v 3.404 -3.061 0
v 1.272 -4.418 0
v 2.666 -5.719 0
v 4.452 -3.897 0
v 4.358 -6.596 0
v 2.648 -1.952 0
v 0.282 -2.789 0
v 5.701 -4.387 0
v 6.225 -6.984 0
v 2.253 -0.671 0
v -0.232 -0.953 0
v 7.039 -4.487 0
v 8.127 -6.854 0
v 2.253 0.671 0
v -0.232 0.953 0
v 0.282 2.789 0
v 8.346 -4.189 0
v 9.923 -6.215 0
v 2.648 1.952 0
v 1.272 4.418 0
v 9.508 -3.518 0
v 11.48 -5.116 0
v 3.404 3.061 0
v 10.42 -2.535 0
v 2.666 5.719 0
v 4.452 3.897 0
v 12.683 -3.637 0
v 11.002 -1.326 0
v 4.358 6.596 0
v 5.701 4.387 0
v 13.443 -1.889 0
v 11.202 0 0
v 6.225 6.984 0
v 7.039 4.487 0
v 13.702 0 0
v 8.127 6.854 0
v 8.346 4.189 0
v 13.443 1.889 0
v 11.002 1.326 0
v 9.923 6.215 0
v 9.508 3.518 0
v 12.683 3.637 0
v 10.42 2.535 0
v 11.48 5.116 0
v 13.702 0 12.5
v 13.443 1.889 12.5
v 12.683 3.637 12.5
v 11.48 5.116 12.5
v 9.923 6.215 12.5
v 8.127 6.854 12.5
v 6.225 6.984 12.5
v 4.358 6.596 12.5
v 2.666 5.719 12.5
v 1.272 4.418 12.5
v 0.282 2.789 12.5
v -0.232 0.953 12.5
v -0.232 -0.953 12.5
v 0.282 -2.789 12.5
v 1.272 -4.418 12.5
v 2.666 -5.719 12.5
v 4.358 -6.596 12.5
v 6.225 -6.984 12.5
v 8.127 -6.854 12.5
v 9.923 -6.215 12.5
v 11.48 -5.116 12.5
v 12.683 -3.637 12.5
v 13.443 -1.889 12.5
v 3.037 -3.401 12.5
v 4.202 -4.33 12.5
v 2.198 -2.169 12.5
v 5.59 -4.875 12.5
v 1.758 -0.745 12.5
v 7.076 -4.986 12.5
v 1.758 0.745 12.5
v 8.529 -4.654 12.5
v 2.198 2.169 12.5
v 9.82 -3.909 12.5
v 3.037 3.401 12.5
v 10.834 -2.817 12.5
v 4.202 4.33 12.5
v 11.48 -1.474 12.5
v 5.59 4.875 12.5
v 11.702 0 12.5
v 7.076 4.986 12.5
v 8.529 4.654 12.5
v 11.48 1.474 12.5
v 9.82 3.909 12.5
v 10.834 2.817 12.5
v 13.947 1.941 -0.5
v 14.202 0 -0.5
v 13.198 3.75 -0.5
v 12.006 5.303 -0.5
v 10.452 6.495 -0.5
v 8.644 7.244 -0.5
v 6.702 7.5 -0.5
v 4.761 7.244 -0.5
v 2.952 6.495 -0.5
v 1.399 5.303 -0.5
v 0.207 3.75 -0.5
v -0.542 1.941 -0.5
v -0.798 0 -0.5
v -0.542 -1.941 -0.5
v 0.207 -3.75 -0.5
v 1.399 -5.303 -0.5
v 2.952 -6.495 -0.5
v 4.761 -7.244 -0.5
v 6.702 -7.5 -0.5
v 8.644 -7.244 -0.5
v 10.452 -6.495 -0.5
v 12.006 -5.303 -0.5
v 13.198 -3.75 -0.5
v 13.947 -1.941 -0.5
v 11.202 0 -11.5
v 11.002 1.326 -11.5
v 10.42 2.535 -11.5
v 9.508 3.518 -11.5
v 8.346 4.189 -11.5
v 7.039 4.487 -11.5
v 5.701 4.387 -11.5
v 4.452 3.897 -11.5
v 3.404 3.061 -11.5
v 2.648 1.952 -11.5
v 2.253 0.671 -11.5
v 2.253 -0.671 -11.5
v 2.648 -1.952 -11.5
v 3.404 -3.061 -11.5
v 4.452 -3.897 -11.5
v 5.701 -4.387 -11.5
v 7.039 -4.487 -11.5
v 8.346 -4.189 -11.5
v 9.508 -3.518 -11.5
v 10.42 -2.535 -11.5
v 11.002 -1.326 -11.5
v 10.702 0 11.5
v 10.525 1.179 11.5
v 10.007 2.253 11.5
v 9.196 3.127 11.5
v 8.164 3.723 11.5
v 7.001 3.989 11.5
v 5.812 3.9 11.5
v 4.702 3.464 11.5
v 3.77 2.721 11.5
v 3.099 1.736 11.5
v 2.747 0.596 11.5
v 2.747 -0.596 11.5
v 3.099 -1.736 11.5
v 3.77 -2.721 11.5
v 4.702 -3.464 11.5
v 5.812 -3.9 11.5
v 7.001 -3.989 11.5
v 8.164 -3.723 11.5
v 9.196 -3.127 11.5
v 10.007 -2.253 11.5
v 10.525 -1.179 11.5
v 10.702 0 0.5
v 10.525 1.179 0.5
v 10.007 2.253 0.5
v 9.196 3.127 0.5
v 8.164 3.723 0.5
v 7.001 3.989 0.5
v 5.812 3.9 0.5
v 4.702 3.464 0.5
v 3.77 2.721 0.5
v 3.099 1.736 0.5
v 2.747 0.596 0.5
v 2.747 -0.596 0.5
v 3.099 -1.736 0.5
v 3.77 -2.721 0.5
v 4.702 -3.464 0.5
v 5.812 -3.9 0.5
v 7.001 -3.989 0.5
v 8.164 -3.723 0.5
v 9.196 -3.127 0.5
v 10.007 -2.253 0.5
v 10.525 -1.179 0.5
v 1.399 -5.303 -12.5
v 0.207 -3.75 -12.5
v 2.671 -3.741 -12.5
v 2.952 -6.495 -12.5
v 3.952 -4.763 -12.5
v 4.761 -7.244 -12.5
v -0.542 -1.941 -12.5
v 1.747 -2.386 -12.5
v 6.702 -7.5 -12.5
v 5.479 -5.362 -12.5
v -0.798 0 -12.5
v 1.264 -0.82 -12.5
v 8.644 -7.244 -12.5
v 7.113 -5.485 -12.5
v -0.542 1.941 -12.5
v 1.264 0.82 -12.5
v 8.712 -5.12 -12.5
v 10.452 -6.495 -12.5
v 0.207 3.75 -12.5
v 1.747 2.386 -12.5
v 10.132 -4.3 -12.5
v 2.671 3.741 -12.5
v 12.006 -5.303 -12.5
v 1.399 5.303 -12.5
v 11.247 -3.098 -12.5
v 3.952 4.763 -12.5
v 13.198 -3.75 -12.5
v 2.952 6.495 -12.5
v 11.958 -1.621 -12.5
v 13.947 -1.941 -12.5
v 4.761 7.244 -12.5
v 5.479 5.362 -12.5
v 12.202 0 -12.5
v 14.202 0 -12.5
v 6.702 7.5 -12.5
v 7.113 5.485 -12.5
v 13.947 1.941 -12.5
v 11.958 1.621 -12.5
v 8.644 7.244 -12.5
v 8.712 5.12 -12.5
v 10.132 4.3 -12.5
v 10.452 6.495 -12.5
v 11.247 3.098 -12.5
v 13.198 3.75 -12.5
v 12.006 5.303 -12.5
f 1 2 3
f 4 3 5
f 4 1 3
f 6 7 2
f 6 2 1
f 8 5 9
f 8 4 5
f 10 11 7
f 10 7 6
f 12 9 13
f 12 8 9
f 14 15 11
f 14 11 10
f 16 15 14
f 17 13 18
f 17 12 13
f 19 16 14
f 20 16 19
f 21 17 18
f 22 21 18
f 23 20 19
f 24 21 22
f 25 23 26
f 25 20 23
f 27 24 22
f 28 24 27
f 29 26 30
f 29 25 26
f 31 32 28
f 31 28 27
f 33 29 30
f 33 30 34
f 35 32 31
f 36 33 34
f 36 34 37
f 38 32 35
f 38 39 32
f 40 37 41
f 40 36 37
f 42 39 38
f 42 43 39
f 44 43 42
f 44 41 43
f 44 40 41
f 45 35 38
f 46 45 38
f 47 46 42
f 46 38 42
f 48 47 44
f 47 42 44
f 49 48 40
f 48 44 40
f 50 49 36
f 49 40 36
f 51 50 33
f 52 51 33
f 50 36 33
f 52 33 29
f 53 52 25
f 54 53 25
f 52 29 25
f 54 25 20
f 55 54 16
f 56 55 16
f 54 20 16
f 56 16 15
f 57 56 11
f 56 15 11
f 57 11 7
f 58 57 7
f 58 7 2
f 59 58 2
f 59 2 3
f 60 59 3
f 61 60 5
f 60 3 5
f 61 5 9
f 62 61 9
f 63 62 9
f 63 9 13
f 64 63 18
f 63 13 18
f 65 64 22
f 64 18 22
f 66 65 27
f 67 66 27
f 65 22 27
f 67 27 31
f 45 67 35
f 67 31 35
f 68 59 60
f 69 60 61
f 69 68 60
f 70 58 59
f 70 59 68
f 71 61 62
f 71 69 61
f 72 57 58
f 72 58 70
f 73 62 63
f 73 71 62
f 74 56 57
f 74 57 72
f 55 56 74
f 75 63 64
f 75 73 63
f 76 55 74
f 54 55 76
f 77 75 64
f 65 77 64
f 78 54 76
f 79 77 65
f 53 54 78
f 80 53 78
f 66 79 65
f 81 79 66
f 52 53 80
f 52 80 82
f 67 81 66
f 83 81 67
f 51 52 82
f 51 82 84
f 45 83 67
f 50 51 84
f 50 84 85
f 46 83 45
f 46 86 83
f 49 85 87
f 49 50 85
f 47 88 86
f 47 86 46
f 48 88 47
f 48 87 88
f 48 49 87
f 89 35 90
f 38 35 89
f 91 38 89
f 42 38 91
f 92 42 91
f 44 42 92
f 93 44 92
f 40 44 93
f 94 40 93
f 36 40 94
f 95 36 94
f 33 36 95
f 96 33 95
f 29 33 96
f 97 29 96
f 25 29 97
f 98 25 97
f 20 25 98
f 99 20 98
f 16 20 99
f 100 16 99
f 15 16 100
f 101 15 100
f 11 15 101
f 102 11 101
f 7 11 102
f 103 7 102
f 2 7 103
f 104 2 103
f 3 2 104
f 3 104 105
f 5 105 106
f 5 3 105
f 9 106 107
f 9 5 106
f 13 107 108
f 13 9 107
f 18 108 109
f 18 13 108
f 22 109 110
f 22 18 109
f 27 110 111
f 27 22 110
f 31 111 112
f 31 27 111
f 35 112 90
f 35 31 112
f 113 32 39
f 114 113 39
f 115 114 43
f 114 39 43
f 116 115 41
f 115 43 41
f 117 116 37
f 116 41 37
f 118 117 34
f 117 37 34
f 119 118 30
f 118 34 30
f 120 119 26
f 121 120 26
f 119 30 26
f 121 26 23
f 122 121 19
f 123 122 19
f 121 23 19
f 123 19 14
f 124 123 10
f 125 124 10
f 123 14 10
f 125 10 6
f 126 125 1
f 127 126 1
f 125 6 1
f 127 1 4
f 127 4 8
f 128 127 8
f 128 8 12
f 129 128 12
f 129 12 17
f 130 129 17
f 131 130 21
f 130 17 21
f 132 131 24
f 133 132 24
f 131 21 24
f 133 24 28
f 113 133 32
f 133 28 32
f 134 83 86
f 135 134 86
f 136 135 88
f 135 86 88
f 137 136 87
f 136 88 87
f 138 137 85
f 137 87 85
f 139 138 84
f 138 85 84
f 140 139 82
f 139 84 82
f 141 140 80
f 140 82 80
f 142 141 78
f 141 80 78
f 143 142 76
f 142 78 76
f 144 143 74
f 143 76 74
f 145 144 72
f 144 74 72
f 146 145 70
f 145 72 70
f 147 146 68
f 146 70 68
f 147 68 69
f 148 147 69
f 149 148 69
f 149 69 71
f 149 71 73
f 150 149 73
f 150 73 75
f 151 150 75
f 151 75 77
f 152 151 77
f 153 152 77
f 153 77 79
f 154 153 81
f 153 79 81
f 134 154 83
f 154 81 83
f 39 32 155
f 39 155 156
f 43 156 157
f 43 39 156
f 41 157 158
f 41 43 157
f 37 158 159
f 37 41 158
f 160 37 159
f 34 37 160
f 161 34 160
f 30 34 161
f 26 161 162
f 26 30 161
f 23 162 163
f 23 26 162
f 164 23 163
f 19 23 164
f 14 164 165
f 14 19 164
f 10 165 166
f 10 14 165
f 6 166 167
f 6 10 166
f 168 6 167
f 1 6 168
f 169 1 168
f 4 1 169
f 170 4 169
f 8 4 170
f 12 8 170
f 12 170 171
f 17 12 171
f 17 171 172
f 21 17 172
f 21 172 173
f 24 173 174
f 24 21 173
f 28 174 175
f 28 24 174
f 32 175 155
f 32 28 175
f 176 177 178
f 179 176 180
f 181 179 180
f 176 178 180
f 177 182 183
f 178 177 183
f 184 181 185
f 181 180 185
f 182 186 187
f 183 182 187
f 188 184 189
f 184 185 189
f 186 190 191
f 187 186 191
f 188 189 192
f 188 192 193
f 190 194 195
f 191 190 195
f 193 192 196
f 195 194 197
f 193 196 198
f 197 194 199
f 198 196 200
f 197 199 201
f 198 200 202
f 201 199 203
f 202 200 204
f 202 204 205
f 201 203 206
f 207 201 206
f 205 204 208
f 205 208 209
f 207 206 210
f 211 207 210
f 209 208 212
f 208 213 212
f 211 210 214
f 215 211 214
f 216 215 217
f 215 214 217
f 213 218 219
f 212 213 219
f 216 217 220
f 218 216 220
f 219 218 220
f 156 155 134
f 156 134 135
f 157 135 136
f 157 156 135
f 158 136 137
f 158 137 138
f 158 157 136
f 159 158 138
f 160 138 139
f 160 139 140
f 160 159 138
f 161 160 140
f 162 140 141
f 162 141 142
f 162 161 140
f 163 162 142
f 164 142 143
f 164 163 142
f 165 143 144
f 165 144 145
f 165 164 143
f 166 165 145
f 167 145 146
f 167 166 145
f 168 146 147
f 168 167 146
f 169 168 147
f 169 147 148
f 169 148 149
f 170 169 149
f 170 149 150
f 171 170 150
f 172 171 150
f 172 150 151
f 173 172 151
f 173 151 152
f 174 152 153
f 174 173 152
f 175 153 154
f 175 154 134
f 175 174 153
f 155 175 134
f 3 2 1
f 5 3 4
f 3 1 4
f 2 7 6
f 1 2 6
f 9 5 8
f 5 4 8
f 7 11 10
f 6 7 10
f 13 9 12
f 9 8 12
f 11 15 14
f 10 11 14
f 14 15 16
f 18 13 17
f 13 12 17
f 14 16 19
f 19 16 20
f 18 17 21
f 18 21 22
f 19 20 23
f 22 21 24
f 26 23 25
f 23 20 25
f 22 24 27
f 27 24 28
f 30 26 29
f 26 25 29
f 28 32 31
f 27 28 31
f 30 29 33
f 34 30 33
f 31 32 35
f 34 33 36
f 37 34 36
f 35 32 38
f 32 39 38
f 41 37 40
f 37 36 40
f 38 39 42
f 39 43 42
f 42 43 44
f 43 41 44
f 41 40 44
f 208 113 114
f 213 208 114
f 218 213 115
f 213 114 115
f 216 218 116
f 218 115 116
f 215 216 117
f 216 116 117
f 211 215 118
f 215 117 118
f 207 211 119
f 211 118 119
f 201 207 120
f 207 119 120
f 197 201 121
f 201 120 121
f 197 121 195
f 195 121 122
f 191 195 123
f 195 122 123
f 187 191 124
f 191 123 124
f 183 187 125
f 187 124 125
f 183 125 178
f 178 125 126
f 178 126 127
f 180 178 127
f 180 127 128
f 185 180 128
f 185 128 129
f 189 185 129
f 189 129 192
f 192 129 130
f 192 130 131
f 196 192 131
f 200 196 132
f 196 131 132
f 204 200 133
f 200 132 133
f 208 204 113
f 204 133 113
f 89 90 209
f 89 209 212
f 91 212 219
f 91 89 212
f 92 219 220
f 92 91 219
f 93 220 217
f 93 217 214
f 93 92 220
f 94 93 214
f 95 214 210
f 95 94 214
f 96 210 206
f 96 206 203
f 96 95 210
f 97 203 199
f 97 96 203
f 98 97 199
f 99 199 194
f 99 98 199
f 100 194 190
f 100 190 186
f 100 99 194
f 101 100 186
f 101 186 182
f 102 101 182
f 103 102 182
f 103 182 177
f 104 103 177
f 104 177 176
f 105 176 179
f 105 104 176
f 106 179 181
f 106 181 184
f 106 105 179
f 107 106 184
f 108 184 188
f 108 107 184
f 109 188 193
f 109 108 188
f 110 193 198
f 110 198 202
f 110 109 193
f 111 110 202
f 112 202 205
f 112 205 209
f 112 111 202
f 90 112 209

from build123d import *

# Parameters (mm, degrees)
F0_R      = 7
F0_R_2    = 4.5
F0_R_3    = 4
F1_DEPTH  = 12.5
F0_R_4    = 7.5
F2_DEPTH  = 12.5
F3_SIZE   = 0.5
F3_2_SIZE = 0.5
F4_SIZE   = 1
F4_2_SIZE = 1


with BuildPart() as f1:
    # F0 (on Top) → F1 (new body)
    with BuildSketch(Plane.XY):
        with Locations((6.702397, 0)):
            Circle(F0_R)
        with Locations((6.702397, 0)):
            Circle(F0_R_2, mode=Mode.SUBTRACT)
        with Locations((6.702397, 0)):
            Circle(F0_R_2)
        with Locations((6.702397, 0)):
            Circle(F0_R_3, mode=Mode.SUBTRACT)
    extrude(amount=F1_DEPTH)

    # F3
    f3_edges = [f1.edges().sort_by_distance(p)[0] for p in [
        (2.702397, 0, 0),
    ]]
    chamfer(f3_edges, length=F3_SIZE)

    # F4#2
    f4_2_edges = [f1.edges().sort_by_distance(p)[0] for p in [
        (2.702397, 0, 12.5),
    ]]
    chamfer(f4_2_edges, length=F4_2_SIZE)


with BuildPart() as f2:
    # F0 (on Top) → F2 (new body)
    with BuildSketch(Plane.XY):
        with Locations((6.702397, 0)):
            Circle(F0_R_4)
        with Locations((6.702397, 0)):
            Circle(F0_R, mode=Mode.SUBTRACT)
        with Locations((6.702397, 0)):
            Circle(F0_R)
        with Locations((6.702397, 0)):
            Circle(F0_R_2, mode=Mode.SUBTRACT)
    extrude(amount=-F2_DEPTH)

    # F3#2
    f3_2_edges = [f2.edges().sort_by_distance(p)[0] for p in [
        (-0.797603, 0, 0),
    ]]
    chamfer(f3_2_edges, length=F3_2_SIZE)

    # F4
    f4_edges = [f2.edges().sort_by_distance(p)[0] for p in [
        (2.202397, 0, -12.5),
    ]]
    chamfer(f4_edges, length=F4_SIZE)


solid = Compound([f1.part, f2.part])
